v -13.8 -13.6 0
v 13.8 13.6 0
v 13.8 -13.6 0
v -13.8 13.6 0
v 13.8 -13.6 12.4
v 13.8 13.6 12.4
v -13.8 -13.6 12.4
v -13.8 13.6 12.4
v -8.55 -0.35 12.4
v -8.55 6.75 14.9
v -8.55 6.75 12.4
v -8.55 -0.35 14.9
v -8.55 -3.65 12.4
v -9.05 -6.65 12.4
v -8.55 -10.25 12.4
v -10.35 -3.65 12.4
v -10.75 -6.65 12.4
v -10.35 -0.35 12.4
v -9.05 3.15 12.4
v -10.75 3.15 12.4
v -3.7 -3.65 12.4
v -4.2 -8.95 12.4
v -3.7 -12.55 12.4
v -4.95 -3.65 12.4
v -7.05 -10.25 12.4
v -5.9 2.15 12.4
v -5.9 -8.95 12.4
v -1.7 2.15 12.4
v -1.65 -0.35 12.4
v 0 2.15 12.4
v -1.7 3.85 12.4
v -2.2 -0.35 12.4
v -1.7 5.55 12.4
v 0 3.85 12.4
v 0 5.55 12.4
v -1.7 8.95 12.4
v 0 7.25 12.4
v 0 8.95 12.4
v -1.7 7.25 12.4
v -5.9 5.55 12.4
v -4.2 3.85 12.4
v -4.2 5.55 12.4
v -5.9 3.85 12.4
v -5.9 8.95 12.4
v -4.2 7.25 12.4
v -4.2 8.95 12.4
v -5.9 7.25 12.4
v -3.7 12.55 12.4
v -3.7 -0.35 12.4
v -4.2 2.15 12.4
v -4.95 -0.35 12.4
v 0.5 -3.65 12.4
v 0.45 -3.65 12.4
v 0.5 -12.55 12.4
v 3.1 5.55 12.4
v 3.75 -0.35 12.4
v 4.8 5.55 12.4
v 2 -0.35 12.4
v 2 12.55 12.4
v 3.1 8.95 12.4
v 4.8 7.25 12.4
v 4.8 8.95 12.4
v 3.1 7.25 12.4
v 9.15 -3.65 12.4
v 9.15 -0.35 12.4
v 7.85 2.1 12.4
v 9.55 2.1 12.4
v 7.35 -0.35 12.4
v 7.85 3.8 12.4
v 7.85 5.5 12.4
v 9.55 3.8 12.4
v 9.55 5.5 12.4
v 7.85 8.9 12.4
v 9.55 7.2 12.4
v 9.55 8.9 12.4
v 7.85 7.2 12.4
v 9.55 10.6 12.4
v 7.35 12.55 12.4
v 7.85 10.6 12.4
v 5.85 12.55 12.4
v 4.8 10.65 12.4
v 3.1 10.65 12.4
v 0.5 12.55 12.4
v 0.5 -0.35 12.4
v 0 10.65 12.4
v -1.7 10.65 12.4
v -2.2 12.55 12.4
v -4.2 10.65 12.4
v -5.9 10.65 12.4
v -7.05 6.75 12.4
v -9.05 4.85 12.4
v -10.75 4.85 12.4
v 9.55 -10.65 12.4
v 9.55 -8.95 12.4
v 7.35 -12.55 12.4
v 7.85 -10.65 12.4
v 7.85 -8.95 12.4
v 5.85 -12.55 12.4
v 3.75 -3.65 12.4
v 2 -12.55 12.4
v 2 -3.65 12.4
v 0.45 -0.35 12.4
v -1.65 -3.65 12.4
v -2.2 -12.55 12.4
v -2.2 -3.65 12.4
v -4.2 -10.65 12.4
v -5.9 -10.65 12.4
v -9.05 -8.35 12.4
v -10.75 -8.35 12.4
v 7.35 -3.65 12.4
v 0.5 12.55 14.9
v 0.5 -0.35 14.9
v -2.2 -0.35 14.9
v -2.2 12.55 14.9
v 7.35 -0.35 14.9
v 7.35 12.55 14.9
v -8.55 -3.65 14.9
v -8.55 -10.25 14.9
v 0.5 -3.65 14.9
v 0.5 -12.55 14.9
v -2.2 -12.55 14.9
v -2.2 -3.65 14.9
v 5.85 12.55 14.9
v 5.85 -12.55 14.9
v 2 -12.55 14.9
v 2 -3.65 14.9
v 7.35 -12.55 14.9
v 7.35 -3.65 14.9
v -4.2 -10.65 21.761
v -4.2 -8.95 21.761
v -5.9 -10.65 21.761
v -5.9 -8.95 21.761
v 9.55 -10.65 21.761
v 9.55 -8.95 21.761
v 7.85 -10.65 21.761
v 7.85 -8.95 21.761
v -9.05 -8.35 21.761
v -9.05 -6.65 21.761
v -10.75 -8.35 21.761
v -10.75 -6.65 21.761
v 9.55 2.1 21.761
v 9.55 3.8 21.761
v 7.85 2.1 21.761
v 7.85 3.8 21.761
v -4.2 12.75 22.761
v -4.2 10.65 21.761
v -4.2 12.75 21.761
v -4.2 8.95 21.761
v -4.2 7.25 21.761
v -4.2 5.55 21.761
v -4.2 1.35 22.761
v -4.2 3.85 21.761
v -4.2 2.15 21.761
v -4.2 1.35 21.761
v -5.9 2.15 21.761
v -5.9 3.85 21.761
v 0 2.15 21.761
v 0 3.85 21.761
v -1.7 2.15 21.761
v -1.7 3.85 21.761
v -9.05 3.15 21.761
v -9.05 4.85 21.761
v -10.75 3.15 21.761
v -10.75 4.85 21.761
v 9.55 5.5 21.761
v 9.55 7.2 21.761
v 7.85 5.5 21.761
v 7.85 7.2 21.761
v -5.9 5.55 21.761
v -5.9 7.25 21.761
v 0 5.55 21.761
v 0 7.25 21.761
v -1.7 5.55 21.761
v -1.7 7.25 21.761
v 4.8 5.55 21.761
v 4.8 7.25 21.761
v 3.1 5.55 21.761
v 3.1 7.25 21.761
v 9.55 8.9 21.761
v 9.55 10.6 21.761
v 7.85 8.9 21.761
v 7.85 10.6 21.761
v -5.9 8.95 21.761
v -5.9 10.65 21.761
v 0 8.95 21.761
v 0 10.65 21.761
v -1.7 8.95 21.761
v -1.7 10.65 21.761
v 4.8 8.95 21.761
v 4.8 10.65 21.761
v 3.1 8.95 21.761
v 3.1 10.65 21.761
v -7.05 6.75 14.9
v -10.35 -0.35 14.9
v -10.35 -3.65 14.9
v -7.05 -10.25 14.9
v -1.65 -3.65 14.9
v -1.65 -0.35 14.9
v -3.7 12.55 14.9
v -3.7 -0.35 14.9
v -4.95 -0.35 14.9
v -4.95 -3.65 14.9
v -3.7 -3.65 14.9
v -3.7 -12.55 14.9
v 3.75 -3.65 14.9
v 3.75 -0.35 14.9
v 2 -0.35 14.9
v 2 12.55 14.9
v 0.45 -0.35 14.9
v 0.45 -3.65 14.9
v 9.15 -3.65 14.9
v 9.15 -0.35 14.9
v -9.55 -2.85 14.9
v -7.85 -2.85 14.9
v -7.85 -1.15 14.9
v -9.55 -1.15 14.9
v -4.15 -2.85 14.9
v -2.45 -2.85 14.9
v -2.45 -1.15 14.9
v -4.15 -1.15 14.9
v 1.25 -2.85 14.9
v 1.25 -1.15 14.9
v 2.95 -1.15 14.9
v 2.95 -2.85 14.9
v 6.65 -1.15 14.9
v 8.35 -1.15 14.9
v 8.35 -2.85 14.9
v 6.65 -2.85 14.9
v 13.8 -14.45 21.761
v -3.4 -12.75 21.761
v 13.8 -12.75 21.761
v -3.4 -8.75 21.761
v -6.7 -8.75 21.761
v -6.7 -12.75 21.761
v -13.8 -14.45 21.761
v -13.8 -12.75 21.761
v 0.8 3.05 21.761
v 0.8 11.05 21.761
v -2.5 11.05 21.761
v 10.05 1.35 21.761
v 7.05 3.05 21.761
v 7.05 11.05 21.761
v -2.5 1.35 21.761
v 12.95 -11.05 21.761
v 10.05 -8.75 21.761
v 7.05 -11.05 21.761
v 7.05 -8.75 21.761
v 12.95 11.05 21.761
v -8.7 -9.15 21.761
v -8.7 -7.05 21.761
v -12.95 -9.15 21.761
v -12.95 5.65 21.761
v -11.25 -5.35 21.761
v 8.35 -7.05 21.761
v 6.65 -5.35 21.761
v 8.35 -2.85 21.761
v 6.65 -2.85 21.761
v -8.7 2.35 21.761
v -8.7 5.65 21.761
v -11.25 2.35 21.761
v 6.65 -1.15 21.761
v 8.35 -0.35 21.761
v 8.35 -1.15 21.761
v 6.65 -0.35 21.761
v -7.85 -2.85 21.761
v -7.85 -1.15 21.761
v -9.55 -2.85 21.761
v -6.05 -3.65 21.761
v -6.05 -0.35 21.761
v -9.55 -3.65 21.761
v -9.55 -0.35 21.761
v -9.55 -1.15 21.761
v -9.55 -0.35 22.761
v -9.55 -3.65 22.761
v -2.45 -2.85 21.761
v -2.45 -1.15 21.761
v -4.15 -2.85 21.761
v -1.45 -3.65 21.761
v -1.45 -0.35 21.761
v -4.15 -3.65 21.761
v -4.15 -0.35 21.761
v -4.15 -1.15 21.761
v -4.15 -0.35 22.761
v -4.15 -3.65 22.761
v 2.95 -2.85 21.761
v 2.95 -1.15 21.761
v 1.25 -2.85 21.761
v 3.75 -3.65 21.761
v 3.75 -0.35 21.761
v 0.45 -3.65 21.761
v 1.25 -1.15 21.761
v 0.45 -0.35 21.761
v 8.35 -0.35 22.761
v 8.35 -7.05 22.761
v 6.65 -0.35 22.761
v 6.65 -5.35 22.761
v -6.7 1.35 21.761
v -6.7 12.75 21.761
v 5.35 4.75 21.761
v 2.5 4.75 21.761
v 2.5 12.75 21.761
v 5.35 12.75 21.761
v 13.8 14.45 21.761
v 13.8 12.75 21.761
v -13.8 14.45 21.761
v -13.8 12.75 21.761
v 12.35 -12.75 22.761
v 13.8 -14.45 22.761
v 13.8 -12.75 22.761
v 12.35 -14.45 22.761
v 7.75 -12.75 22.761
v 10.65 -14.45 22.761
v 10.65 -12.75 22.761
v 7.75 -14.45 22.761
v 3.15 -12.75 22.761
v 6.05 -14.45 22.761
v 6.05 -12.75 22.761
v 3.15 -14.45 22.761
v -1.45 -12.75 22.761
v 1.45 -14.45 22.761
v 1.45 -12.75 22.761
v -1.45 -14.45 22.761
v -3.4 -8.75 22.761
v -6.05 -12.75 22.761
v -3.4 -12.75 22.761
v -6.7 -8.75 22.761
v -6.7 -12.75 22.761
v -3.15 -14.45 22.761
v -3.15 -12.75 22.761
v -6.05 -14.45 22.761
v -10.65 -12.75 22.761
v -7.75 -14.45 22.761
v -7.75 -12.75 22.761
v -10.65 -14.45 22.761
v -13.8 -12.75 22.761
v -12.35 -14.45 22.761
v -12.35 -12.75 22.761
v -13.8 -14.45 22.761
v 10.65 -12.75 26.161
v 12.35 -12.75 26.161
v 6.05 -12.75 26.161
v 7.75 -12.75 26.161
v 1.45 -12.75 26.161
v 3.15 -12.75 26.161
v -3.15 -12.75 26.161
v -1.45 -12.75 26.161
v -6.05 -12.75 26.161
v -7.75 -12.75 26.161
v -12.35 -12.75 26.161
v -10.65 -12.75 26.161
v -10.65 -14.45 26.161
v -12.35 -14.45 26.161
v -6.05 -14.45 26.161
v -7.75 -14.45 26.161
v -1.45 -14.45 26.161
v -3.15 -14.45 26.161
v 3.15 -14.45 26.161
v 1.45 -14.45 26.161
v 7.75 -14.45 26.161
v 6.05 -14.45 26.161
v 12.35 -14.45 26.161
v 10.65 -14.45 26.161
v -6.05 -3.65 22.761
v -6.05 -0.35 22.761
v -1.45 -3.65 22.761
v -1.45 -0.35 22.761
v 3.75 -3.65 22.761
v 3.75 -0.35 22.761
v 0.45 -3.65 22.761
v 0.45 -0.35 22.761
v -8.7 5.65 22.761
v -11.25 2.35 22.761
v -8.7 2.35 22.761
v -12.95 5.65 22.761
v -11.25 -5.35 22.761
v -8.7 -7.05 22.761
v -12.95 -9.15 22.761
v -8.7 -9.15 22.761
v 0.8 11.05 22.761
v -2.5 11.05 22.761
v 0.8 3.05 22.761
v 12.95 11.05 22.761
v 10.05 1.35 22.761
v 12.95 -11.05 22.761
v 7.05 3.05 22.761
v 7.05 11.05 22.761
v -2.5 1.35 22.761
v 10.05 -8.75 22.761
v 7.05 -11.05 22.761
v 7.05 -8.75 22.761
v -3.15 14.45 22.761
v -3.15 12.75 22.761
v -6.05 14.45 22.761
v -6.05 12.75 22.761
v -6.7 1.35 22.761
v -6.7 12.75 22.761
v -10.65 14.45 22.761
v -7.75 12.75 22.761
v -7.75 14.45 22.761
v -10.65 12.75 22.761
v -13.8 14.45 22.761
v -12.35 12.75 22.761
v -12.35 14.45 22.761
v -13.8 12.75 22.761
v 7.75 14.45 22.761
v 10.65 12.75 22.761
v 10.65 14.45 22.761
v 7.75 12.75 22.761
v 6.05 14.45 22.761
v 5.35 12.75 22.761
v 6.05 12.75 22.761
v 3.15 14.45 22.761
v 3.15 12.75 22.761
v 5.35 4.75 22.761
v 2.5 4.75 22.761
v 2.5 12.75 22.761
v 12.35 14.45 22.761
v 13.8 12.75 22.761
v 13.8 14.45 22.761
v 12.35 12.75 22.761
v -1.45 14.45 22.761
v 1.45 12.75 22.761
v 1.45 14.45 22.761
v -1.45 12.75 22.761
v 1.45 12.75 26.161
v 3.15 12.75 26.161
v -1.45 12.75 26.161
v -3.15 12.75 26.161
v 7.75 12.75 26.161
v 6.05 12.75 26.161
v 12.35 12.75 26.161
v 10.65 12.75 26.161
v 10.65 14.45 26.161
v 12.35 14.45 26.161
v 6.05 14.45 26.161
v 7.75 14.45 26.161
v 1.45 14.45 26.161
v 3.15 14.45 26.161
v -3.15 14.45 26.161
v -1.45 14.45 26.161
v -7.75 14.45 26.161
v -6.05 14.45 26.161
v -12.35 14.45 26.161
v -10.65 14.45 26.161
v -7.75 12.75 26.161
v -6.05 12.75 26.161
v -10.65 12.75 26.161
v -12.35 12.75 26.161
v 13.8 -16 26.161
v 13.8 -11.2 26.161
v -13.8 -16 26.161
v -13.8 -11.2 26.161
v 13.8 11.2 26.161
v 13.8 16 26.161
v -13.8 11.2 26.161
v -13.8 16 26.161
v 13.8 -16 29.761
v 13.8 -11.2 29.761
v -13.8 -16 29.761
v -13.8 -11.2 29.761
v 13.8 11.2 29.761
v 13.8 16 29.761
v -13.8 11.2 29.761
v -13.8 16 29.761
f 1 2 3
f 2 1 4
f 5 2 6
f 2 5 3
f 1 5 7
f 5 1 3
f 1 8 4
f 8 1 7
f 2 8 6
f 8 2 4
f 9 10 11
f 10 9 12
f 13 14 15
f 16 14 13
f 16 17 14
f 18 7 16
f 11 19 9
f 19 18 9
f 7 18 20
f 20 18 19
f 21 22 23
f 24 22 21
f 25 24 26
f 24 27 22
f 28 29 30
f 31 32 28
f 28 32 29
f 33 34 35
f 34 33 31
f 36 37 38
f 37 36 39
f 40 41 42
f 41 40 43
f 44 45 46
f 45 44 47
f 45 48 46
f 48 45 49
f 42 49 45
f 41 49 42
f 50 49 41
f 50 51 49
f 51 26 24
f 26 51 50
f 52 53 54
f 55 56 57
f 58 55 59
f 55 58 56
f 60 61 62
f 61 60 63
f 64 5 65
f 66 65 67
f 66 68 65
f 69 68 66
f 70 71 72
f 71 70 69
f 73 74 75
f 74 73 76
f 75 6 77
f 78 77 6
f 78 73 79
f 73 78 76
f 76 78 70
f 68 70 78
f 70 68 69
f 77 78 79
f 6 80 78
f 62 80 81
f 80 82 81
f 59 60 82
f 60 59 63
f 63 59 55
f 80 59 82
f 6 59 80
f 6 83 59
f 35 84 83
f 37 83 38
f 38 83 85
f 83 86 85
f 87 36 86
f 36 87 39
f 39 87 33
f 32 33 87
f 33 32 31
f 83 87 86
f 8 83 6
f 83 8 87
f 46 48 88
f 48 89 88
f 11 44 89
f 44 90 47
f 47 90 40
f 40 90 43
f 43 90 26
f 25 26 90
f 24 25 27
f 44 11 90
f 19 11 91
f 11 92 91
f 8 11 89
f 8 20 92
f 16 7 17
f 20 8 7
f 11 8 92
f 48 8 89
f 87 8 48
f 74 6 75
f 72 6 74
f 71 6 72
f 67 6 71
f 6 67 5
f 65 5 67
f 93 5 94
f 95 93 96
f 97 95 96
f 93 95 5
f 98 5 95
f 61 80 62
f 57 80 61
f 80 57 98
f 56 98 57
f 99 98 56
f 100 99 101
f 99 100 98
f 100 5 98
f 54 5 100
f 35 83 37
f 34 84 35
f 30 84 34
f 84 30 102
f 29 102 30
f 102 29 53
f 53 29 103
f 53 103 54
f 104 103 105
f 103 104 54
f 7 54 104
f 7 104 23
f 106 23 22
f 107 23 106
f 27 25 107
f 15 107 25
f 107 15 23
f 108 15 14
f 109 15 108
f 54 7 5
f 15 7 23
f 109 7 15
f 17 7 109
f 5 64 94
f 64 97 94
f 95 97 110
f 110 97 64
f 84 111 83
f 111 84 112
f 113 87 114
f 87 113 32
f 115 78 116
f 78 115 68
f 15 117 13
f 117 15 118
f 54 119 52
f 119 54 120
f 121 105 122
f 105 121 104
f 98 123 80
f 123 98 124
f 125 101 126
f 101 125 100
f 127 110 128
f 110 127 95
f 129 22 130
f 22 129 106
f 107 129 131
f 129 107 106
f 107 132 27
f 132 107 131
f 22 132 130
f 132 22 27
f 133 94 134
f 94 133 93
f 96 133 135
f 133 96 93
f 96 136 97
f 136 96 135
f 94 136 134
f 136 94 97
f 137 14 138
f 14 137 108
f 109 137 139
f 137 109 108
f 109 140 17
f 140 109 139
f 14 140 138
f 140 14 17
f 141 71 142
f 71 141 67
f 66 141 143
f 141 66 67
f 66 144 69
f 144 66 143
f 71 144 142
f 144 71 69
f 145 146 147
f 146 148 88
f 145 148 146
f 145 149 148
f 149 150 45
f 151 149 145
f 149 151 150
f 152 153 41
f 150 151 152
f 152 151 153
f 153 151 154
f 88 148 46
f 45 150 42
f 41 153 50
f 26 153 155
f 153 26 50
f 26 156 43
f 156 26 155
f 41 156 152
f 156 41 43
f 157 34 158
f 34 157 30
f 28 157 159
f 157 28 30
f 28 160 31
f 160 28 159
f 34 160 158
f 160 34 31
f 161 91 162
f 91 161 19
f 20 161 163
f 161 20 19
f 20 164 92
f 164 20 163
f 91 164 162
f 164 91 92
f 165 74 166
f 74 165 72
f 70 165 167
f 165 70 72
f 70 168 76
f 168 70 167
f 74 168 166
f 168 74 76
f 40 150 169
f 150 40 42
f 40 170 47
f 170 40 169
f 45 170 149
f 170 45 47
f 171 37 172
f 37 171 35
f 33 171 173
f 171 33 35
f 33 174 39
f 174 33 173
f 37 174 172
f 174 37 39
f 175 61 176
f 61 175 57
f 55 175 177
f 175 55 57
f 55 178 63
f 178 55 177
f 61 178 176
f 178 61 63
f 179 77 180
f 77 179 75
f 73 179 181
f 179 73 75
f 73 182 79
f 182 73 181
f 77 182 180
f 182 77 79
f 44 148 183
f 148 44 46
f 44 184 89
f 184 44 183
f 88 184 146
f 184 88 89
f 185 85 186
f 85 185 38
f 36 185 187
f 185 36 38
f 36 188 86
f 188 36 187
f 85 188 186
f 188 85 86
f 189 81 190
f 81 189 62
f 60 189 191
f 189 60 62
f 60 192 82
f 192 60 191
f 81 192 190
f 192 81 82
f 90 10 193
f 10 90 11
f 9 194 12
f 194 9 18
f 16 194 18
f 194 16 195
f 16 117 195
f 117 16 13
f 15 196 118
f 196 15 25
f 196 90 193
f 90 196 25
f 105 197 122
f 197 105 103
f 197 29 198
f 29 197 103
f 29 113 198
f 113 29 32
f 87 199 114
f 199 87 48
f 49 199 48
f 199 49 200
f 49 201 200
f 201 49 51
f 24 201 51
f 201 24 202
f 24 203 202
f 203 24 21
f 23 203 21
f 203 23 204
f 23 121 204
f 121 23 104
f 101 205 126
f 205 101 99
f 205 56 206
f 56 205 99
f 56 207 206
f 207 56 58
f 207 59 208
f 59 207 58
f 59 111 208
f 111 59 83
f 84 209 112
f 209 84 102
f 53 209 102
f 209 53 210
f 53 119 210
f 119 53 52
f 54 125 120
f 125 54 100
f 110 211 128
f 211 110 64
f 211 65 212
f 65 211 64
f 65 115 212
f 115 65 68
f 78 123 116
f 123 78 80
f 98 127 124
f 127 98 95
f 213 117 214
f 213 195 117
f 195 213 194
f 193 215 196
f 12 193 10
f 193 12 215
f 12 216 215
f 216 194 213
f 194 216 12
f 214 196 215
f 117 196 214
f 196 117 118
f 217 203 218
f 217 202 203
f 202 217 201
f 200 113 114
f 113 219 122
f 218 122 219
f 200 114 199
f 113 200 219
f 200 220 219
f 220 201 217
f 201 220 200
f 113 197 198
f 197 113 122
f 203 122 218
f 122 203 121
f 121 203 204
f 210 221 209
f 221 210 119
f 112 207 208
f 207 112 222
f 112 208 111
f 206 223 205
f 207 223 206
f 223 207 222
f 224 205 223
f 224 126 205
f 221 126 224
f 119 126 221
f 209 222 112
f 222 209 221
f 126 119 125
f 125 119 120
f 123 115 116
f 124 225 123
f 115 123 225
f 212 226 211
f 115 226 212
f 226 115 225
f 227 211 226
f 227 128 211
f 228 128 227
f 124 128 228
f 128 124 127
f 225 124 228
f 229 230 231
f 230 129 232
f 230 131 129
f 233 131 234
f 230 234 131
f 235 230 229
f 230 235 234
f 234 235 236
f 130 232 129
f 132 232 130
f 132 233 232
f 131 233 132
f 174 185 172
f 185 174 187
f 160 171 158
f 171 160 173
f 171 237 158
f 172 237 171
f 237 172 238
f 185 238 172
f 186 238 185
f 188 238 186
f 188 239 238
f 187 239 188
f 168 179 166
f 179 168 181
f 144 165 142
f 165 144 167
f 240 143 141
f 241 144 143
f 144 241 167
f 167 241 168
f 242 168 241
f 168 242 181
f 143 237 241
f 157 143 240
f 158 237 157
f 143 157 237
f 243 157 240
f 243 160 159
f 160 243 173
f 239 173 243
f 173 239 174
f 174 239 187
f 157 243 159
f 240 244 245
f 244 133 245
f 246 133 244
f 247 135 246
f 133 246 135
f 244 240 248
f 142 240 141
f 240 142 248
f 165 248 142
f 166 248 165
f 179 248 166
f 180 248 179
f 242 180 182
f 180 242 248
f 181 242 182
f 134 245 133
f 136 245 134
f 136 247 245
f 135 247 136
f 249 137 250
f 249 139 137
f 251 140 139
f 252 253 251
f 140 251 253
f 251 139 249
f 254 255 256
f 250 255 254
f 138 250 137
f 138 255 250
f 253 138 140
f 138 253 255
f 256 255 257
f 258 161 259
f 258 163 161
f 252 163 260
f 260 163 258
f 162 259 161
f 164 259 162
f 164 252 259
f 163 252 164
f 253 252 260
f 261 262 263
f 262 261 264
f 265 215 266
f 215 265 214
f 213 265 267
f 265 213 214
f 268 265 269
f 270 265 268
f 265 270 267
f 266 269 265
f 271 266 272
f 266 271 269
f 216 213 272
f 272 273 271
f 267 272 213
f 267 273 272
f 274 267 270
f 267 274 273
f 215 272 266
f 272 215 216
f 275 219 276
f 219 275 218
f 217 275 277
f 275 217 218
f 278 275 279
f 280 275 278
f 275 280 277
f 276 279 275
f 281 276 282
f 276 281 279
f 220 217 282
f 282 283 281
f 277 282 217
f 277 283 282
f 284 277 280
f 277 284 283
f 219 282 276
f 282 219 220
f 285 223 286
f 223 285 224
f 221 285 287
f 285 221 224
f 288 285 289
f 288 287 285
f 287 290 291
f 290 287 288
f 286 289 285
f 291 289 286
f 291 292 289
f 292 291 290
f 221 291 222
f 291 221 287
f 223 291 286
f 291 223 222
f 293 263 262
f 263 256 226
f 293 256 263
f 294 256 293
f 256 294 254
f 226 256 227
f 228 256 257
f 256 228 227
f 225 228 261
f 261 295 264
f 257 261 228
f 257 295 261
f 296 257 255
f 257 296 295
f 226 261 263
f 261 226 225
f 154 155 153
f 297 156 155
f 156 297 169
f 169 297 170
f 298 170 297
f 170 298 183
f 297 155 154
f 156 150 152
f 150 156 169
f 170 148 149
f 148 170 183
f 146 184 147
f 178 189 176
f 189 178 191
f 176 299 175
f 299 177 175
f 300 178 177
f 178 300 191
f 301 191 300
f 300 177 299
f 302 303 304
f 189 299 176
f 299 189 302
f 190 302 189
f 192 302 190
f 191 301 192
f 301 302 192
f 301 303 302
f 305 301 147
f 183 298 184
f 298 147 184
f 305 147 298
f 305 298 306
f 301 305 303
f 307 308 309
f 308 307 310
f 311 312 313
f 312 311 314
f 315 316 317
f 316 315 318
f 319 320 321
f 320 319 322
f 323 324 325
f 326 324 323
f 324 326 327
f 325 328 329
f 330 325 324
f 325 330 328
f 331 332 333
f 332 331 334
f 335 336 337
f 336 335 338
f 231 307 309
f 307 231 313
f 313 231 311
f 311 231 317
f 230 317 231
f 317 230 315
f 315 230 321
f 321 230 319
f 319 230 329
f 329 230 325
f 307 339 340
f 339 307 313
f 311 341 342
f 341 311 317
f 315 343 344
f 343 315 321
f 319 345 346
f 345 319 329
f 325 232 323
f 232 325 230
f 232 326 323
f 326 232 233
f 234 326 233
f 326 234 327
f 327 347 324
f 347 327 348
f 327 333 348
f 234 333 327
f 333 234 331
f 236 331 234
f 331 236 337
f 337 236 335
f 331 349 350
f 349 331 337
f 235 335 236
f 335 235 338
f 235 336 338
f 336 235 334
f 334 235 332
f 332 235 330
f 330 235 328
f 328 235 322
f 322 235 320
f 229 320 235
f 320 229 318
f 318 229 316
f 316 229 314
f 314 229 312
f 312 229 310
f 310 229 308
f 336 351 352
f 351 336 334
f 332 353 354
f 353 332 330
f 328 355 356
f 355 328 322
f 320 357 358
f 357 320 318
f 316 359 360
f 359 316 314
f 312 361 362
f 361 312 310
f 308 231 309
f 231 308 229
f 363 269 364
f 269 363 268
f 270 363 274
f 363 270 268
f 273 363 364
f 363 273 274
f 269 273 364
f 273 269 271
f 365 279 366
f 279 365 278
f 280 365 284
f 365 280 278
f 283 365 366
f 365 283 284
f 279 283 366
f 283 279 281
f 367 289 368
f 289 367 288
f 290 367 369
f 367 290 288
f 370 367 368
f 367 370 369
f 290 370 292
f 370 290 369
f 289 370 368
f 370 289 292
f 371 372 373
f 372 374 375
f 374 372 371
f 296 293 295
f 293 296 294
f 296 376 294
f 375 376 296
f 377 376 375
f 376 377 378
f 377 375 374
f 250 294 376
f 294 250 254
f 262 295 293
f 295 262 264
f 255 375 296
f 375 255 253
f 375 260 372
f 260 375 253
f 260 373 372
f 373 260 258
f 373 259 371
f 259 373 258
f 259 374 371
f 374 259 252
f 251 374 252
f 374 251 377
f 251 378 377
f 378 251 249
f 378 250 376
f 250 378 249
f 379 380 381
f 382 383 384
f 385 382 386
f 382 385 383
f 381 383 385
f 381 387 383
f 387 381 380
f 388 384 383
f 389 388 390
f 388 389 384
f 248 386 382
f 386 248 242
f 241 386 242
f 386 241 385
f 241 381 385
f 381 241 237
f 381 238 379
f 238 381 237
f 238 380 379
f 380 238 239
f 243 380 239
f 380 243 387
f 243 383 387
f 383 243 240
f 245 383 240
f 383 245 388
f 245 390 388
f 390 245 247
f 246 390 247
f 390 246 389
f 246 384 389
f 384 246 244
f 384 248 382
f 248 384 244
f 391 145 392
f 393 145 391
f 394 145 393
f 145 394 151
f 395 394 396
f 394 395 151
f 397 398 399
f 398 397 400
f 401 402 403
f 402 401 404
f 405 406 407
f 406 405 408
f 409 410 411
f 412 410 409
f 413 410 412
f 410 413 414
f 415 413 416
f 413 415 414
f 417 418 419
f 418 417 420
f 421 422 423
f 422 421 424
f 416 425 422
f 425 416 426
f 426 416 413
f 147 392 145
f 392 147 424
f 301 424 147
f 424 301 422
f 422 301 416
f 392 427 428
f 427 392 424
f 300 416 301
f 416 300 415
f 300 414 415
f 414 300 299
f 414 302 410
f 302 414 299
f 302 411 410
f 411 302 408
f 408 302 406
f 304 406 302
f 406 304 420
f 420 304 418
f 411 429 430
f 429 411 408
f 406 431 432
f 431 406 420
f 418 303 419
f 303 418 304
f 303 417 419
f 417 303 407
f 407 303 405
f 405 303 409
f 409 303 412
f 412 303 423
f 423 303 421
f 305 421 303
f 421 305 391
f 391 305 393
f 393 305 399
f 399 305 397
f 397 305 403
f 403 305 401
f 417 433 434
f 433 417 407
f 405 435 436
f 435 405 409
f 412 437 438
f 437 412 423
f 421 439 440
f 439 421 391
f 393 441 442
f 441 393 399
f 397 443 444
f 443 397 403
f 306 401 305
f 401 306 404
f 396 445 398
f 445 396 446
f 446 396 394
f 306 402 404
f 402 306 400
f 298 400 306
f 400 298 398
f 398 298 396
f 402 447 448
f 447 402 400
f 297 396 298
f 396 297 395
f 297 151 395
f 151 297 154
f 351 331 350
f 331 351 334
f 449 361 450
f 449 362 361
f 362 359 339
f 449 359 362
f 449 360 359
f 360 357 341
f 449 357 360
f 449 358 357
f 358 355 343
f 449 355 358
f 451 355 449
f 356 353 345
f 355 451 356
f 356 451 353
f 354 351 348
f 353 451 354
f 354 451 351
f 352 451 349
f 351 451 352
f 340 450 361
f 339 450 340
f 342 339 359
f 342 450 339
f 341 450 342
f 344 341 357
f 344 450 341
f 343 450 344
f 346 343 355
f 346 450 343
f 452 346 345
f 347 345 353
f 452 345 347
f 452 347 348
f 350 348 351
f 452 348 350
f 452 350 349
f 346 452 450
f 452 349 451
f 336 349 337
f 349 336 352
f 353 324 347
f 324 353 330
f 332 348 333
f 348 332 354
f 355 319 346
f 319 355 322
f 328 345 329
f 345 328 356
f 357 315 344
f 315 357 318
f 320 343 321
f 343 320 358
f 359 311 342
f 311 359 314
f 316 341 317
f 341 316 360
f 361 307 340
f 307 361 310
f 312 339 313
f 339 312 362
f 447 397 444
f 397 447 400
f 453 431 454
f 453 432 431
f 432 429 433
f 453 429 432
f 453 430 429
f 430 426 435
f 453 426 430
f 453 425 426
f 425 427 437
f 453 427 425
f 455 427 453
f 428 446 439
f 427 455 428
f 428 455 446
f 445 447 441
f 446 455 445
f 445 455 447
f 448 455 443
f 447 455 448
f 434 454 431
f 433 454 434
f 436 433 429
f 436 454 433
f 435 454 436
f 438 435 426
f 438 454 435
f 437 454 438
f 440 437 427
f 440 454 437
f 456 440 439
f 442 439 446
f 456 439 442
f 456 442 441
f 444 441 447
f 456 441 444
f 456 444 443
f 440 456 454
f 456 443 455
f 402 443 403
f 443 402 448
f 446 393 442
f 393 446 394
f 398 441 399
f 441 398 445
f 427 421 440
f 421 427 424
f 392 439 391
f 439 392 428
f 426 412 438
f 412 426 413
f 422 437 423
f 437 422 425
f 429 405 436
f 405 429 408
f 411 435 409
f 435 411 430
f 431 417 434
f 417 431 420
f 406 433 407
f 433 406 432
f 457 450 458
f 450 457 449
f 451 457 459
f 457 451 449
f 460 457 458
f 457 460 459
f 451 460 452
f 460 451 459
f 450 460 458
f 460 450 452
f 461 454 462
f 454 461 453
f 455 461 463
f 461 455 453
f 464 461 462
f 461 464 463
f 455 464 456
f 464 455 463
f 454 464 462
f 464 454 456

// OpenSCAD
// Generated by SolidPython 0.4.2 on 2020-09-29 23:21:23
//!OpenSCAD

scale(v = 0.0100000000) {
	translate(v = [-1380, -1360, 0]) {
		union() {
			color(c = [0.4000000000, 0.4000000000, 0.4000000000]) {
				translate(v = [0, 0, 0]) {
					linear_extrude(height = 1000.0000000000) {
						polygon(paths = [[0, 1, 2, 3]], points = [[0, 0], [0, 2720], [2760, 2720], [2760, 0]]);
					}
				}
			}
			color(c = [0.2000000000, 0.6000000000, 0.2000000000]) {
				translate(v = [0, 0, 1000.0000000000]) {
					linear_extrude(height = 120.0000000000) {
						polygon(paths = [[0, 1, 2, 3]], points = [[0, 1305], [0, 2720], [2760, 2720], [2760, 1305]]);
					}
				}
			}
			color(c = [0.4000000000, 0.4000000000, 0.4000000000]) {
				translate(v = [0, 0, 1000.0000000000]) {
					linear_extrude(height = 120.0000000000) {
						polygon(paths = [[0, 1, 2, 3]], points = [[0, 0], [0, 1305], [2760, 1305], [2760, 0]]);
					}
				}
			}
			color(c = [0.9000000000, 0.6000000000, 0.6000000000]) {
				translate(v = [0, 0, 1120.0000000000]) {
					linear_extrude(height = 120.0000000000) {
						polygon(paths = [[0, 1, 2, 3]], points = [[265, 1485], [265, 1905], [525, 1905], [525, 1485]]);
					}
				}
			}
			color(c = [0.9000000000, 0.6000000000, 0.6000000000]) {
				translate(v = [0, 0, 1120.0000000000]) {
					linear_extrude(height = 120.0000000000) {
						polygon(paths = [[0, 1, 2, 3, 4, 5]], points = [[675, 1485], [675, 1905], [750, 1905], [750, 2485], [1010, 2485], [1010, 1485]]);
					}
				}
			}
			color(c = [0.9000000000, 0.6000000000, 0.6000000000]) {
				translate(v = [0, 0, 1120.0000000000]) {
					linear_extrude(height = 120.0000000000) {
						polygon(paths = [[0, 1, 2, 3]], points = [[1160, 1485], [1160, 2485], [1430, 2485], [1430, 1485]]);
					}
				}
			}
			color(c = [0.9000000000, 0.6000000000, 0.6000000000]) {
				translate(v = [0, 0, 1120.0000000000]) {
					linear_extrude(height = 120.0000000000) {
						polygon(paths = [[0, 1, 2, 3]], points = [[1580, 1485], [1580, 2485], [1965, 2485], [1965, 1485]]);
					}
				}
			}
			color(c = [0.9000000000, 0.6000000000, 0.6000000000]) {
				translate(v = [0, 0, 1120.0000000000]) {
					linear_extrude(height = 120.0000000000) {
						polygon(paths = [[0, 1, 2, 3]], points = [[2115, 1485], [2115, 2485], [2395, 2485], [2395, 1485]]);
					}
				}
			}
			color(c = [0.9000000000, 0.6000000000, 0.9000000000]) {
				translate(v = [0, 0, 1120.0000000000]) {
					linear_extrude(height = 120.0000000000) {
						polygon(paths = [[0, 1, 2, 3]], points = [[265, 465], [265, 885], [525, 885], [525, 465]]);
					}
				}
			}
			color(c = [0.9000000000, 0.6000000000, 0.9000000000]) {
				translate(v = [0, 0, 1120.0000000000]) {
					linear_extrude(height = 120.0000000000) {
						polygon(paths = [[0, 1, 2, 3, 4, 5]], points = [[750, 235], [750, 465], [675, 465], [675, 885], [1010, 885], [1010, 235]]);
					}
				}
			}
			color(c = [0.9000000000, 0.6000000000, 0.9000000000]) {
				translate(v = [0, 0, 1120.0000000000]) {
					linear_extrude(height = 120.0000000000) {
						polygon(paths = [[0, 1, 2, 3]], points = [[1160, 235], [1160, 885], [1430, 885], [1430, 235]]);
					}
				}
			}
			color(c = [0.9000000000, 0.6000000000, 0.9000000000]) {
				translate(v = [0, 0, 1120.0000000000]) {
					linear_extrude(height = 120.0000000000) {
						polygon(paths = [[0, 1, 2, 3]], points = [[1580, 235], [1580, 885], [1965, 885], [1965, 235]]);
					}
				}
			}
			color(c = [0.9000000000, 0.6000000000, 0.9000000000]) {
				translate(v = [0, 0, 1120.0000000000]) {
					linear_extrude(height = 120.0000000000) {
						polygon(paths = [[0, 1, 2, 3]], points = [[2115, 235], [2115, 885], [2395, 885], [2395, 235]]);
					}
				}
			}
			color(c = [0.2000000000, 0.6000000000, 0.2000000000]) {
				translate(v = [0, 0, 1120.0000000000]) {
					linear_extrude(height = 120.0000000000) {
						difference() {
							polygon(paths = [[0, 1, 2, 3]], points = [[0, 1305], [0, 2720], [2760, 2720], [2760, 1305]]);
							polygon(paths = [[0, 1, 2, 3]], points = [[265, 1485], [525, 1485], [525, 1905], [265, 1905]]);
							polygon(paths = [[0, 1, 2, 3]], points = [[1160, 1485], [1430, 1485], [1430, 2485], [1160, 2485]]);
							polygon(paths = [[0, 1, 2, 3]], points = [[1580, 1485], [1965, 1485], [1965, 2485], [1580, 2485]]);
							polygon(paths = [[0, 1, 2, 3]], points = [[2115, 1485], [2395, 1485], [2395, 2485], [2115, 2485]]);
							polygon(paths = [[0, 1, 2, 3, 4, 5]], points = [[675, 1485], [1010, 1485], [1010, 2485], [750, 2485], [750, 1905], [675, 1905]]);
						}
					}
				}
			}
			color(c = [0.4000000000, 0.4000000000, 0.4000000000]) {
				translate(v = [0, 0, 1120.0000000000]) {
					linear_extrude(height = 120.0000000000) {
						difference() {
							polygon(paths = [[0, 1, 2, 3]], points = [[0, 0], [0, 1305], [2760, 1305], [2760, 0]]);
							polygon(paths = [[0, 1, 2, 3]], points = [[1160, 235], [1430, 235], [1430, 885], [1160, 885]]);
							polygon(paths = [[0, 1, 2, 3]], points = [[1580, 235], [1965, 235], [1965, 885], [1580, 885]]);
							polygon(paths = [[0, 1, 2, 3]], points = [[2115, 235], [2395, 235], [2395, 885], [2115, 885]]);
							polygon(paths = [[0, 1, 2, 3]], points = [[265, 465], [525, 465], [525, 885], [265, 885]]);
							polygon(paths = [[0, 1, 2, 3, 4, 5]], points = [[750, 235], [1010, 235], [1010, 885], [675, 885], [675, 465], [750, 465]]);
						}
					}
				}
			}
			color(c = [0.1000000000, 0.1000000000, 0.1000000000]) {
				translate(v = [0, 0, 1240.0000000000]) {
					linear_extrude(height = 70.0000000000) {
						polygon(paths = [[0, 1, 2, 3]], points = [[790, 295], [790, 465], [960, 465], [960, 295]]);
					}
				}
			}
			color(c = [0.1000000000, 0.1000000000, 0.1000000000]) {
				translate(v = [0, 0, 1240.0000000000]) {
					linear_extrude(height = 70.0000000000) {
						polygon(paths = [[0, 1, 2, 3]], points = [[2165, 295], [2165, 465], [2335, 465], [2335, 295]]);
					}
				}
			}
			color(c = [0.1000000000, 0.1000000000, 0.1000000000]) {
				translate(v = [0, 0, 1240.0000000000]) {
					linear_extrude(height = 70.0000000000) {
						polygon(paths = [[0, 1, 2, 3]], points = [[305, 525], [305, 695], [475, 695], [475, 525]]);
					}
				}
			}
			color(c = [0.1000000000, 0.1000000000, 0.1000000000]) {
				translate(v = [0, 0, 1240.0000000000]) {
					linear_extrude(height = 70.0000000000) {
						polygon(paths = [[0, 1, 2, 3]], points = [[2165, 1570], [2165, 1740], [2335, 1740], [2335, 1570]]);
					}
				}
			}
			color(c = [0.1000000000, 0.1000000000, 0.1000000000]) {
				translate(v = [0, 0, 1240.0000000000]) {
					linear_extrude(height = 70.0000000000) {
						polygon(paths = [[0, 1, 2, 3]], points = [[790, 1575], [790, 1745], [960, 1745], [960, 1575]]);
					}
				}
			}
			color(c = [0.1000000000, 0.1000000000, 0.1000000000]) {
				translate(v = [0, 0, 1240.0000000000]) {
					linear_extrude(height = 70.0000000000) {
						polygon(paths = [[0, 1, 2, 3]], points = [[1210, 1575], [1210, 1745], [1380, 1745], [1380, 1575]]);
					}
				}
			}
			color(c = [0.1000000000, 0.1000000000, 0.1000000000]) {
				translate(v = [0, 0, 1240.0000000000]) {
					linear_extrude(height = 70.0000000000) {
						polygon(paths = [[0, 1, 2, 3]], points = [[305, 1675], [305, 1845], [475, 1845], [475, 1675]]);
					}
				}
			}
			color(c = [0.1000000000, 0.1000000000, 0.1000000000]) {
				translate(v = [0, 0, 1240.0000000000]) {
					linear_extrude(height = 70.0000000000) {
						polygon(paths = [[0, 1, 2, 3]], points = [[2165, 1910], [2165, 2080], [2335, 2080], [2335, 1910]]);
					}
				}
			}
			color(c = [0.1000000000, 0.1000000000, 0.1000000000]) {
				translate(v = [0, 0, 1240.0000000000]) {
					linear_extrude(height = 70.0000000000) {
						polygon(paths = [[0, 1, 2, 3]], points = [[790, 1915], [790, 2085], [960, 2085], [960, 1915]]);
					}
				}
			}
			color(c = [0.1000000000, 0.1000000000, 0.1000000000]) {
				translate(v = [0, 0, 1240.0000000000]) {
					linear_extrude(height = 70.0000000000) {
						polygon(paths = [[0, 1, 2, 3]], points = [[1210, 1915], [1210, 2085], [1380, 2085], [1380, 1915]]);
					}
				}
			}
			color(c = [0.1000000000, 0.1000000000, 0.1000000000]) {
				translate(v = [0, 0, 1240.0000000000]) {
					linear_extrude(height = 70.0000000000) {
						polygon(paths = [[0, 1, 2, 3]], points = [[1690, 1915], [1690, 2085], [1860, 2085], [1860, 1915]]);
					}
				}
			}
			color(c = [0.1000000000, 0.1000000000, 0.1000000000]) {
				translate(v = [0, 0, 1240.0000000000]) {
					linear_extrude(height = 70.0000000000) {
						polygon(paths = [[0, 1, 2, 3]], points = [[2165, 2250], [2165, 2420], [2335, 2420], [2335, 2250]]);
					}
				}
			}
			color(c = [0.1000000000, 0.1000000000, 0.1000000000]) {
				translate(v = [0, 0, 1240.0000000000]) {
					linear_extrude(height = 70.0000000000) {
						polygon(paths = [[0, 1, 2, 3]], points = [[790, 2255], [790, 2425], [960, 2425], [960, 2255]]);
					}
				}
			}
			color(c = [0.1000000000, 0.1000000000, 0.1000000000]) {
				translate(v = [0, 0, 1240.0000000000]) {
					linear_extrude(height = 70.0000000000) {
						polygon(paths = [[0, 1, 2, 3]], points = [[1210, 2255], [1210, 2425], [1380, 2425], [1380, 2255]]);
					}
				}
			}
			color(c = [0.1000000000, 0.1000000000, 0.1000000000]) {
				translate(v = [0, 0, 1240.0000000000]) {
					linear_extrude(height = 70.0000000000) {
						polygon(paths = [[0, 1, 2, 3]], points = [[1690, 2255], [1690, 2425], [1860, 2425], [1860, 2255]]);
					}
				}
			}
			color(c = [1.0000000000, 1.0000000000, 1.0000000000]) {
				translate(v = [0, 0, 1240.0000000000]) {
					linear_extrude(height = 70.0000000000) {
						polygon(paths = [[0, 1, 2, 3, 4, 5, 6, 7]], points = [[525, 335], [525, 995], [345, 995], [345, 1325], [525, 1325], [525, 2035], [675, 2035], [675, 335]]);
					}
				}
			}
			color(c = [1.0000000000, 1.0000000000, 1.0000000000]) {
				translate(v = [0, 0, 1240.0000000000]) {
					linear_extrude(height = 70.0000000000) {
						polygon(paths = [[0, 1, 2, 3, 4, 5, 6, 7, 8, 9, 10, 11]], points = [[1010, 105], [1010, 995], [885, 995], [885, 1325], [1010, 1325], [1010, 2615], [1160, 2615], [1160, 1325], [1215, 1325], [1215, 995], [1160, 995], [1160, 105]]);
					}
				}
			}
			color(c = [1.0000000000, 1.0000000000, 1.0000000000]) {
				translate(v = [0, 0, 1240.0000000000]) {
					linear_extrude(height = 70.0000000000) {
						polygon(paths = [[0, 1, 2, 3, 4, 5, 6, 7, 8, 9, 10, 11]], points = [[1430, 105], [1430, 995], [1425, 995], [1425, 1325], [1430, 1325], [1430, 2615], [1580, 2615], [1580, 1325], [1755, 1325], [1755, 995], [1580, 995], [1580, 105]]);
					}
				}
			}
			color(c = [1.0000000000, 1.0000000000, 1.0000000000]) {
				translate(v = [0, 0, 1240.0000000000]) {
					linear_extrude(height = 70.0000000000) {
						polygon(paths = [[0, 1, 2, 3, 4, 5, 6, 7]], points = [[1965, 105], [1965, 2615], [2115, 2615], [2115, 1325], [2295, 1325], [2295, 995], [2115, 995], [2115, 105]]);
					}
				}
			}
			color(c = [0.1000000000, 0.1000000000, 0.1000000000]) {
				translate(v = [0, 0, 1310.0000000000]) {
					linear_extrude(height = 180.0000000000) {
						polygon(paths = [[0, 1, 2, 3]], points = [[790, 295], [790, 465], [960, 465], [960, 295]]);
					}
				}
			}
			color(c = [0.1000000000, 0.1000000000, 0.1000000000]) {
				translate(v = [0, 0, 1310.0000000000]) {
					linear_extrude(height = 180.0000000000) {
						polygon(paths = [[0, 1, 2, 3]], points = [[2165, 295], [2165, 465], [2335, 465], [2335, 295]]);
					}
				}
			}
			color(c = [0.1000000000, 0.1000000000, 0.1000000000]) {
				translate(v = [0, 0, 1310.0000000000]) {
					linear_extrude(height = 180.0000000000) {
						polygon(paths = [[0, 1, 2, 3]], points = [[305, 525], [305, 695], [475, 695], [475, 525]]);
					}
				}
			}
			color(c = [0.1000000000, 0.1000000000, 0.1000000000]) {
				translate(v = [0, 0, 1310.0000000000]) {
					linear_extrude(height = 180.0000000000) {
						polygon(paths = [[0, 1, 2, 3]], points = [[2165, 1570], [2165, 1740], [2335, 1740], [2335, 1570]]);
					}
				}
			}
			color(c = [0.1000000000, 0.1000000000, 0.1000000000]) {
				translate(v = [0, 0, 1310.0000000000]) {
					linear_extrude(height = 180.0000000000) {
						polygon(paths = [[0, 1, 2, 3]], points = [[790, 1575], [790, 1745], [960, 1745], [960, 1575]]);
					}
				}
			}
			color(c = [0.1000000000, 0.1000000000, 0.1000000000]) {
				translate(v = [0, 0, 1310.0000000000]) {
					linear_extrude(height = 180.0000000000) {
						polygon(paths = [[0, 1, 2, 3]], points = [[1210, 1575], [1210, 1745], [1380, 1745], [1380, 1575]]);
					}
				}
			}
			color(c = [0.1000000000, 0.1000000000, 0.1000000000]) {
				translate(v = [0, 0, 1310.0000000000]) {
					linear_extrude(height = 180.0000000000) {
						polygon(paths = [[0, 1, 2, 3]], points = [[305, 1675], [305, 1845], [475, 1845], [475, 1675]]);
					}
				}
			}
			color(c = [0.1000000000, 0.1000000000, 0.1000000000]) {
				translate(v = [0, 0, 1310.0000000000]) {
					linear_extrude(height = 180.0000000000) {
						polygon(paths = [[0, 1, 2, 3]], points = [[2165, 1910], [2165, 2080], [2335, 2080], [2335, 1910]]);
					}
				}
			}
			color(c = [0.1000000000, 0.1000000000, 0.1000000000]) {
				translate(v = [0, 0, 1310.0000000000]) {
					linear_extrude(height = 180.0000000000) {
						polygon(paths = [[0, 1, 2, 3]], points = [[790, 1915], [790, 2085], [960, 2085], [960, 1915]]);
					}
				}
			}
			color(c = [0.1000000000, 0.1000000000, 0.1000000000]) {
				translate(v = [0, 0, 1310.0000000000]) {
					linear_extrude(height = 180.0000000000) {
						polygon(paths = [[0, 1, 2, 3]], points = [[1210, 1915], [1210, 2085], [1380, 2085], [1380, 1915]]);
					}
				}
			}
			color(c = [0.1000000000, 0.1000000000, 0.1000000000]) {
				translate(v = [0, 0, 1310.0000000000]) {
					linear_extrude(height = 180.0000000000) {
						polygon(paths = [[0, 1, 2, 3]], points = [[1690, 1915], [1690, 2085], [1860, 2085], [1860, 1915]]);
					}
				}
			}
			color(c = [0.1000000000, 0.1000000000, 0.1000000000]) {
				translate(v = [0, 0, 1310.0000000000]) {
					linear_extrude(height = 180.0000000000) {
						polygon(paths = [[0, 1, 2, 3]], points = [[2165, 2250], [2165, 2420], [2335, 2420], [2335, 2250]]);
					}
				}
			}
			color(c = [0.1000000000, 0.1000000000, 0.1000000000]) {
				translate(v = [0, 0, 1310.0000000000]) {
					linear_extrude(height = 180.0000000000) {
						polygon(paths = [[0, 1, 2, 3]], points = [[790, 2255], [790, 2425], [960, 2425], [960, 2255]]);
					}
				}
			}
			color(c = [0.1000000000, 0.1000000000, 0.1000000000]) {
				translate(v = [0, 0, 1310.0000000000]) {
					linear_extrude(height = 180.0000000000) {
						polygon(paths = [[0, 1, 2, 3]], points = [[1210, 2255], [1210, 2425], [1380, 2425], [1380, 2255]]);
					}
				}
			}
			color(c = [0.1000000000, 0.1000000000, 0.1000000000]) {
				translate(v = [0, 0, 1310.0000000000]) {
					linear_extrude(height = 180.0000000000) {
						polygon(paths = [[0, 1, 2, 3]], points = [[1690, 2255], [1690, 2425], [1860, 2425], [1860, 2255]]);
					}
				}
			}
			color(c = [0.7000000000, 0, 0]) {
				translate(v = [0, 0, 1310.0000000000]) {
					linear_extrude(height = 180.0000000000) {
						polygon(paths = [[0, 1, 2, 3, 4, 5, 6, 7]], points = [[525, 335], [525, 995], [345, 995], [345, 1325], [525, 1325], [525, 2035], [675, 2035], [675, 335]]);
					}
				}
			}
			color(c = [0.7000000000, 0, 0]) {
				translate(v = [0, 0, 1310.0000000000]) {
					linear_extrude(height = 180.0000000000) {
						polygon(paths = [[0, 1, 2, 3, 4, 5, 6, 7, 8, 9, 10, 11]], points = [[1010, 105], [1010, 995], [885, 995], [885, 1325], [1010, 1325], [1010, 2615], [1160, 2615], [1160, 1325], [1215, 1325], [1215, 995], [1160, 995], [1160, 105]]);
					}
				}
			}
			color(c = [0.7000000000, 0, 0]) {
				translate(v = [0, 0, 1310.0000000000]) {
					linear_extrude(height = 180.0000000000) {
						polygon(paths = [[0, 1, 2, 3, 4, 5, 6, 7, 8, 9, 10, 11]], points = [[1430, 105], [1430, 995], [1425, 995], [1425, 1325], [1430, 1325], [1430, 2615], [1580, 2615], [1580, 1325], [1755, 1325], [1755, 995], [1580, 995], [1580, 105]]);
					}
				}
			}
			color(c = [0.7000000000, 0, 0]) {
				translate(v = [0, 0, 1310.0000000000]) {
					linear_extrude(height = 180.0000000000) {
						polygon(paths = [[0, 1, 2, 3, 4, 5, 6, 7]], points = [[1965, 105], [1965, 2615], [2115, 2615], [2115, 1325], [2295, 1325], [2295, 995], [2115, 995], [2115, 105]]);
					}
				}
			}
			color(c = [0.1000000000, 0.1000000000, 0.1000000000]) {
				translate(v = [0, 0, 1490.0000000000]) {
					linear_extrude(height = 686.1000000000) {
						polygon(paths = [[0, 1, 2, 3]], points = [[790, 295], [790, 465], [960, 465], [960, 295]]);
					}
				}
			}
			color(c = [0.1000000000, 0.1000000000, 0.1000000000]) {
				translate(v = [0, 0, 1490.0000000000]) {
					linear_extrude(height = 686.1000000000) {
						polygon(paths = [[0, 1, 2, 3]], points = [[2165, 295], [2165, 465], [2335, 465], [2335, 295]]);
					}
				}
			}
			color(c = [0.1000000000, 0.1000000000, 0.1000000000]) {
				translate(v = [0, 0, 1490.0000000000]) {
					linear_extrude(height = 686.1000000000) {
						polygon(paths = [[0, 1, 2, 3]], points = [[305, 525], [305, 695], [475, 695], [475, 525]]);
					}
				}
			}
			color(c = [0.1000000000, 0.1000000000, 0.1000000000]) {
				translate(v = [0, 0, 1490.0000000000]) {
					linear_extrude(height = 686.1000000000) {
						polygon(paths = [[0, 1, 2, 3]], points = [[425, 1075], [425, 1245], [595, 1245], [595, 1075]]);
					}
				}
			}
			color(c = [0.1000000000, 0.1000000000, 0.1000000000]) {
				translate(v = [0, 0, 1490.0000000000]) {
					linear_extrude(height = 686.1000000000) {
						polygon(paths = [[0, 1, 2, 3]], points = [[965, 1075], [965, 1245], [1135, 1245], [1135, 1075]]);
					}
				}
			}
			color(c = [0.1000000000, 0.1000000000, 0.1000000000]) {
				translate(v = [0, 0, 1490.0000000000]) {
					linear_extrude(height = 686.1000000000) {
						polygon(paths = [[0, 1, 2, 3]], points = [[1505, 1075], [1505, 1245], [1675, 1245], [1675, 1075]]);
					}
				}
			}
			color(c = [0.1000000000, 0.1000000000, 0.1000000000]) {
				translate(v = [0, 0, 1490.0000000000]) {
					linear_extrude(height = 686.1000000000) {
						polygon(paths = [[0, 1, 2, 3]], points = [[2045, 1075], [2045, 1245], [2215, 1245], [2215, 1075]]);
					}
				}
			}
			color(c = [0.1000000000, 0.1000000000, 0.1000000000]) {
				translate(v = [0, 0, 1490.0000000000]) {
					linear_extrude(height = 686.1000000000) {
						polygon(paths = [[0, 1, 2, 3]], points = [[2165, 1570], [2165, 1740], [2335, 1740], [2335, 1570]]);
					}
				}
			}
			color(c = [0.1000000000, 0.1000000000, 0.1000000000]) {
				translate(v = [0, 0, 1490.0000000000]) {
					linear_extrude(height = 686.1000000000) {
						polygon(paths = [[0, 1, 2, 3]], points = [[790, 1575], [790, 1745], [960, 1745], [960, 1575]]);
					}
				}
			}
			color(c = [0.1000000000, 0.1000000000, 0.1000000000]) {
				translate(v = [0, 0, 1490.0000000000]) {
					linear_extrude(height = 686.1000000000) {
						polygon(paths = [[0, 1, 2, 3]], points = [[1210, 1575], [1210, 1745], [1380, 1745], [1380, 1575]]);
					}
				}
			}
			color(c = [0.1000000000, 0.1000000000, 0.1000000000]) {
				translate(v = [0, 0, 1490.0000000000]) {
					linear_extrude(height = 686.1000000000) {
						polygon(paths = [[0, 1, 2, 3]], points = [[305, 1675], [305, 1845], [475, 1845], [475, 1675]]);
					}
				}
			}
			color(c = [0.1000000000, 0.1000000000, 0.1000000000]) {
				translate(v = [0, 0, 1490.0000000000]) {
					linear_extrude(height = 686.1000000000) {
						polygon(paths = [[0, 1, 2, 3]], points = [[2165, 1910], [2165, 2080], [2335, 2080], [2335, 1910]]);
					}
				}
			}
			color(c = [0.1000000000, 0.1000000000, 0.1000000000]) {
				translate(v = [0, 0, 1490.0000000000]) {
					linear_extrude(height = 686.1000000000) {
						polygon(paths = [[0, 1, 2, 3]], points = [[790, 1915], [790, 2085], [960, 2085], [960, 1915]]);
					}
				}
			}
			color(c = [0.1000000000, 0.1000000000, 0.1000000000]) {
				translate(v = [0, 0, 1490.0000000000]) {
					linear_extrude(height = 686.1000000000) {
						polygon(paths = [[0, 1, 2, 3]], points = [[1210, 1915], [1210, 2085], [1380, 2085], [1380, 1915]]);
					}
				}
			}
			color(c = [0.1000000000, 0.1000000000, 0.1000000000]) {
				translate(v = [0, 0, 1490.0000000000]) {
					linear_extrude(height = 686.1000000000) {
						polygon(paths = [[0, 1, 2, 3]], points = [[1690, 1915], [1690, 2085], [1860, 2085], [1860, 1915]]);
					}
				}
			}
			color(c = [0.1000000000, 0.1000000000, 0.1000000000]) {
				translate(v = [0, 0, 1490.0000000000]) {
					linear_extrude(height = 686.1000000000) {
						polygon(paths = [[0, 1, 2, 3]], points = [[2165, 2250], [2165, 2420], [2335, 2420], [2335, 2250]]);
					}
				}
			}
			color(c = [0.1000000000, 0.1000000000, 0.1000000000]) {
				translate(v = [0, 0, 1490.0000000000]) {
					linear_extrude(height = 686.1000000000) {
						polygon(paths = [[0, 1, 2, 3]], points = [[790, 2255], [790, 2425], [960, 2425], [960, 2255]]);
					}
				}
			}
			color(c = [0.1000000000, 0.1000000000, 0.1000000000]) {
				translate(v = [0, 0, 1490.0000000000]) {
					linear_extrude(height = 686.1000000000) {
						polygon(paths = [[0, 1, 2, 3]], points = [[1210, 2255], [1210, 2425], [1380, 2425], [1380, 2255]]);
					}
				}
			}
			color(c = [0.1000000000, 0.1000000000, 0.1000000000]) {
				translate(v = [0, 0, 1490.0000000000]) {
					linear_extrude(height = 686.1000000000) {
						polygon(paths = [[0, 1, 2, 3]], points = [[1690, 2255], [1690, 2425], [1860, 2425], [1860, 2255]]);
					}
				}
			}
			color(c = [0.9000000000, 0.6000000000, 0.6000000000]) {
				translate(v = [0, 0, 2176.1000000000]) {
					linear_extrude(height = 100.0000000000) {
						polygon(paths = [[0, 1, 2, 3, 4, 5, 6, 7]], points = [[0, -85], [0, 85], [710, 85], [710, 485], [1040, 485], [1040, 85], [2760, 85], [2760, -85]]);
					}
				}
			}
			color(c = [0.9000000000, 0.6000000000, 0.6000000000]) {
				translate(v = [0, 0, 2176.1000000000]) {
					linear_extrude(height = 100.0000000000) {
						polygon(paths = [[0, 1, 2, 3]], points = [[425, 995], [425, 1325], [775, 1325], [775, 995]]);
					}
				}
			}
			color(c = [0.9000000000, 0.6000000000, 0.6000000000]) {
				translate(v = [0, 0, 2176.1000000000]) {
					linear_extrude(height = 100.0000000000) {
						polygon(paths = [[0, 1, 2, 3]], points = [[965, 995], [965, 1325], [1235, 1325], [1235, 995]]);
					}
				}
			}
			color(c = [0.9000000000, 0.6000000000, 0.6000000000]) {
				translate(v = [0, 0, 2176.1000000000]) {
					linear_extrude(height = 100.0000000000) {
						polygon(paths = [[0, 1, 2, 3]], points = [[1425, 995], [1425, 1325], [1755, 1325], [1755, 995]]);
					}
				}
			}
			color(c = [0.9000000000, 0.6000000000, 0.6000000000]) {
				translate(v = [0, 0, 2176.1000000000]) {
					linear_extrude(height = 100.0000000000) {
						polygon(paths = [[0, 1, 2, 3, 4, 5, 6, 7, 8, 9, 10, 11]], points = [[85, 445], [85, 1925], [510, 1925], [510, 1595], [255, 1595], [255, 825], [2045, 825], [2045, 1325], [2215, 1325], [2215, 655], [510, 655], [510, 445]]);
					}
				}
			}
			color(c = [0.9000000000, 0.6000000000, 0.6000000000]) {
				translate(v = [0, 0, 2176.1000000000]) {
					linear_extrude(height = 100.0000000000) {
						polygon(paths = [[0, 1, 2, 3, 4, 5, 6, 7, 8, 9, 10, 11]], points = [[2085, 255], [2085, 485], [2385, 485], [2385, 1495], [1130, 1495], [1130, 2465], [1460, 2465], [1460, 1665], [2085, 1665], [2085, 2465], [2675, 2465], [2675, 255]]);
					}
				}
			}
			color(c = [0.9000000000, 0.6000000000, 0.6000000000]) {
				translate(v = [0, 0, 2176.1000000000]) {
					linear_extrude(height = 100.0000000000) {
						polygon(paths = [[0, 1, 2, 3, 4, 5, 6, 7, 8, 9, 10, 11]], points = [[710, 1495], [710, 2635], [0, 2635], [0, 2805], [2760, 2805], [2760, 2635], [1915, 2635], [1915, 1835], [1630, 1835], [1630, 2635], [960, 2635], [960, 1495]]);
					}
				}
			}
			color(c = [0.5000000000, 0.5000000000, 0.5000000000]) {
				translate(v = [0, 0, 2276.1000000000]) {
					linear_extrude(height = 340.0000000000) {
						polygon(paths = [[0, 1, 2, 3]], points = [[145, -85], [145, 85], [315, 85], [315, -85]]);
					}
				}
			}
			color(c = [0.5000000000, 0.5000000000, 0.5000000000]) {
				translate(v = [0, 0, 2276.1000000000]) {
					linear_extrude(height = 340.0000000000) {
						polygon(paths = [[0, 1, 2, 3]], points = [[605, -85], [605, 85], [775, 85], [775, -85]]);
					}
				}
			}
			color(c = [0.5000000000, 0.5000000000, 0.5000000000]) {
				translate(v = [0, 0, 2276.1000000000]) {
					linear_extrude(height = 340.0000000000) {
						polygon(paths = [[0, 1, 2, 3]], points = [[1065, -85], [1065, 85], [1235, 85], [1235, -85]]);
					}
				}
			}
			color(c = [0.5000000000, 0.5000000000, 0.5000000000]) {
				translate(v = [0, 0, 2276.1000000000]) {
					linear_extrude(height = 340.0000000000) {
						polygon(paths = [[0, 1, 2, 3]], points = [[1525, -85], [1525, 85], [1695, 85], [1695, -85]]);
					}
				}
			}
			color(c = [0.5000000000, 0.5000000000, 0.5000000000]) {
				translate(v = [0, 0, 2276.1000000000]) {
					linear_extrude(height = 340.0000000000) {
						polygon(paths = [[0, 1, 2, 3]], points = [[1985, -85], [1985, 85], [2155, 85], [2155, -85]]);
					}
				}
			}
			color(c = [0.5000000000, 0.5000000000, 0.5000000000]) {
				translate(v = [0, 0, 2276.1000000000]) {
					linear_extrude(height = 340.0000000000) {
						polygon(paths = [[0, 1, 2, 3]], points = [[2445, -85], [2445, 85], [2615, 85], [2615, -85]]);
					}
				}
			}
			color(c = [0.5000000000, 0.5000000000, 0.5000000000]) {
				translate(v = [0, 0, 2276.1000000000]) {
					linear_extrude(height = 340.0000000000) {
						polygon(paths = [[0, 1, 2, 3]], points = [[145, 2635], [145, 2805], [315, 2805], [315, 2635]]);
					}
				}
			}
			color(c = [0.5000000000, 0.5000000000, 0.5000000000]) {
				translate(v = [0, 0, 2276.1000000000]) {
					linear_extrude(height = 340.0000000000) {
						polygon(paths = [[0, 1, 2, 3]], points = [[605, 2635], [605, 2805], [775, 2805], [775, 2635]]);
					}
				}
			}
			color(c = [0.5000000000, 0.5000000000, 0.5000000000]) {
				translate(v = [0, 0, 2276.1000000000]) {
					linear_extrude(height = 340.0000000000) {
						polygon(paths = [[0, 1, 2, 3]], points = [[1065, 2635], [1065, 2805], [1235, 2805], [1235, 2635]]);
					}
				}
			}
			color(c = [0.5000000000, 0.5000000000, 0.5000000000]) {
				translate(v = [0, 0, 2276.1000000000]) {
					linear_extrude(height = 340.0000000000) {
						polygon(paths = [[0, 1, 2, 3]], points = [[1525, 2635], [1525, 2805], [1695, 2805], [1695, 2635]]);
					}
				}
			}
			color(c = [0.5000000000, 0.5000000000, 0.5000000000]) {
				translate(v = [0, 0, 2276.1000000000]) {
					linear_extrude(height = 340.0000000000) {
						polygon(paths = [[0, 1, 2, 3]], points = [[1985, 2635], [1985, 2805], [2155, 2805], [2155, 2635]]);
					}
				}
			}
			color(c = [0.5000000000, 0.5000000000, 0.5000000000]) {
				translate(v = [0, 0, 2276.1000000000]) {
					linear_extrude(height = 340.0000000000) {
						polygon(paths = [[0, 1, 2, 3]], points = [[2445, 2635], [2445, 2805], [2615, 2805], [2615, 2635]]);
					}
				}
			}
			color(c = [0.3000000000, 0.3000000000, 1]) {
				translate(v = [0, 0, 2616.1000000000]) {
					linear_extrude(height = 360.0000000000) {
						polygon(paths = [[0, 1, 2, 3]], points = [[0, -240], [0, 240], [2760, 240], [2760, -240]]);
					}
				}
			}
			color(c = [0.3000000000, 0.3000000000, 1]) {
				translate(v = [0, 0, 2616.1000000000]) {
					linear_extrude(height = 360.0000000000) {
						polygon(paths = [[0, 1, 2, 3]], points = [[0, 2480], [0, 2960], [2760, 2960], [2760, 2480]]);
					}
				}
			}
		}
	}
}
